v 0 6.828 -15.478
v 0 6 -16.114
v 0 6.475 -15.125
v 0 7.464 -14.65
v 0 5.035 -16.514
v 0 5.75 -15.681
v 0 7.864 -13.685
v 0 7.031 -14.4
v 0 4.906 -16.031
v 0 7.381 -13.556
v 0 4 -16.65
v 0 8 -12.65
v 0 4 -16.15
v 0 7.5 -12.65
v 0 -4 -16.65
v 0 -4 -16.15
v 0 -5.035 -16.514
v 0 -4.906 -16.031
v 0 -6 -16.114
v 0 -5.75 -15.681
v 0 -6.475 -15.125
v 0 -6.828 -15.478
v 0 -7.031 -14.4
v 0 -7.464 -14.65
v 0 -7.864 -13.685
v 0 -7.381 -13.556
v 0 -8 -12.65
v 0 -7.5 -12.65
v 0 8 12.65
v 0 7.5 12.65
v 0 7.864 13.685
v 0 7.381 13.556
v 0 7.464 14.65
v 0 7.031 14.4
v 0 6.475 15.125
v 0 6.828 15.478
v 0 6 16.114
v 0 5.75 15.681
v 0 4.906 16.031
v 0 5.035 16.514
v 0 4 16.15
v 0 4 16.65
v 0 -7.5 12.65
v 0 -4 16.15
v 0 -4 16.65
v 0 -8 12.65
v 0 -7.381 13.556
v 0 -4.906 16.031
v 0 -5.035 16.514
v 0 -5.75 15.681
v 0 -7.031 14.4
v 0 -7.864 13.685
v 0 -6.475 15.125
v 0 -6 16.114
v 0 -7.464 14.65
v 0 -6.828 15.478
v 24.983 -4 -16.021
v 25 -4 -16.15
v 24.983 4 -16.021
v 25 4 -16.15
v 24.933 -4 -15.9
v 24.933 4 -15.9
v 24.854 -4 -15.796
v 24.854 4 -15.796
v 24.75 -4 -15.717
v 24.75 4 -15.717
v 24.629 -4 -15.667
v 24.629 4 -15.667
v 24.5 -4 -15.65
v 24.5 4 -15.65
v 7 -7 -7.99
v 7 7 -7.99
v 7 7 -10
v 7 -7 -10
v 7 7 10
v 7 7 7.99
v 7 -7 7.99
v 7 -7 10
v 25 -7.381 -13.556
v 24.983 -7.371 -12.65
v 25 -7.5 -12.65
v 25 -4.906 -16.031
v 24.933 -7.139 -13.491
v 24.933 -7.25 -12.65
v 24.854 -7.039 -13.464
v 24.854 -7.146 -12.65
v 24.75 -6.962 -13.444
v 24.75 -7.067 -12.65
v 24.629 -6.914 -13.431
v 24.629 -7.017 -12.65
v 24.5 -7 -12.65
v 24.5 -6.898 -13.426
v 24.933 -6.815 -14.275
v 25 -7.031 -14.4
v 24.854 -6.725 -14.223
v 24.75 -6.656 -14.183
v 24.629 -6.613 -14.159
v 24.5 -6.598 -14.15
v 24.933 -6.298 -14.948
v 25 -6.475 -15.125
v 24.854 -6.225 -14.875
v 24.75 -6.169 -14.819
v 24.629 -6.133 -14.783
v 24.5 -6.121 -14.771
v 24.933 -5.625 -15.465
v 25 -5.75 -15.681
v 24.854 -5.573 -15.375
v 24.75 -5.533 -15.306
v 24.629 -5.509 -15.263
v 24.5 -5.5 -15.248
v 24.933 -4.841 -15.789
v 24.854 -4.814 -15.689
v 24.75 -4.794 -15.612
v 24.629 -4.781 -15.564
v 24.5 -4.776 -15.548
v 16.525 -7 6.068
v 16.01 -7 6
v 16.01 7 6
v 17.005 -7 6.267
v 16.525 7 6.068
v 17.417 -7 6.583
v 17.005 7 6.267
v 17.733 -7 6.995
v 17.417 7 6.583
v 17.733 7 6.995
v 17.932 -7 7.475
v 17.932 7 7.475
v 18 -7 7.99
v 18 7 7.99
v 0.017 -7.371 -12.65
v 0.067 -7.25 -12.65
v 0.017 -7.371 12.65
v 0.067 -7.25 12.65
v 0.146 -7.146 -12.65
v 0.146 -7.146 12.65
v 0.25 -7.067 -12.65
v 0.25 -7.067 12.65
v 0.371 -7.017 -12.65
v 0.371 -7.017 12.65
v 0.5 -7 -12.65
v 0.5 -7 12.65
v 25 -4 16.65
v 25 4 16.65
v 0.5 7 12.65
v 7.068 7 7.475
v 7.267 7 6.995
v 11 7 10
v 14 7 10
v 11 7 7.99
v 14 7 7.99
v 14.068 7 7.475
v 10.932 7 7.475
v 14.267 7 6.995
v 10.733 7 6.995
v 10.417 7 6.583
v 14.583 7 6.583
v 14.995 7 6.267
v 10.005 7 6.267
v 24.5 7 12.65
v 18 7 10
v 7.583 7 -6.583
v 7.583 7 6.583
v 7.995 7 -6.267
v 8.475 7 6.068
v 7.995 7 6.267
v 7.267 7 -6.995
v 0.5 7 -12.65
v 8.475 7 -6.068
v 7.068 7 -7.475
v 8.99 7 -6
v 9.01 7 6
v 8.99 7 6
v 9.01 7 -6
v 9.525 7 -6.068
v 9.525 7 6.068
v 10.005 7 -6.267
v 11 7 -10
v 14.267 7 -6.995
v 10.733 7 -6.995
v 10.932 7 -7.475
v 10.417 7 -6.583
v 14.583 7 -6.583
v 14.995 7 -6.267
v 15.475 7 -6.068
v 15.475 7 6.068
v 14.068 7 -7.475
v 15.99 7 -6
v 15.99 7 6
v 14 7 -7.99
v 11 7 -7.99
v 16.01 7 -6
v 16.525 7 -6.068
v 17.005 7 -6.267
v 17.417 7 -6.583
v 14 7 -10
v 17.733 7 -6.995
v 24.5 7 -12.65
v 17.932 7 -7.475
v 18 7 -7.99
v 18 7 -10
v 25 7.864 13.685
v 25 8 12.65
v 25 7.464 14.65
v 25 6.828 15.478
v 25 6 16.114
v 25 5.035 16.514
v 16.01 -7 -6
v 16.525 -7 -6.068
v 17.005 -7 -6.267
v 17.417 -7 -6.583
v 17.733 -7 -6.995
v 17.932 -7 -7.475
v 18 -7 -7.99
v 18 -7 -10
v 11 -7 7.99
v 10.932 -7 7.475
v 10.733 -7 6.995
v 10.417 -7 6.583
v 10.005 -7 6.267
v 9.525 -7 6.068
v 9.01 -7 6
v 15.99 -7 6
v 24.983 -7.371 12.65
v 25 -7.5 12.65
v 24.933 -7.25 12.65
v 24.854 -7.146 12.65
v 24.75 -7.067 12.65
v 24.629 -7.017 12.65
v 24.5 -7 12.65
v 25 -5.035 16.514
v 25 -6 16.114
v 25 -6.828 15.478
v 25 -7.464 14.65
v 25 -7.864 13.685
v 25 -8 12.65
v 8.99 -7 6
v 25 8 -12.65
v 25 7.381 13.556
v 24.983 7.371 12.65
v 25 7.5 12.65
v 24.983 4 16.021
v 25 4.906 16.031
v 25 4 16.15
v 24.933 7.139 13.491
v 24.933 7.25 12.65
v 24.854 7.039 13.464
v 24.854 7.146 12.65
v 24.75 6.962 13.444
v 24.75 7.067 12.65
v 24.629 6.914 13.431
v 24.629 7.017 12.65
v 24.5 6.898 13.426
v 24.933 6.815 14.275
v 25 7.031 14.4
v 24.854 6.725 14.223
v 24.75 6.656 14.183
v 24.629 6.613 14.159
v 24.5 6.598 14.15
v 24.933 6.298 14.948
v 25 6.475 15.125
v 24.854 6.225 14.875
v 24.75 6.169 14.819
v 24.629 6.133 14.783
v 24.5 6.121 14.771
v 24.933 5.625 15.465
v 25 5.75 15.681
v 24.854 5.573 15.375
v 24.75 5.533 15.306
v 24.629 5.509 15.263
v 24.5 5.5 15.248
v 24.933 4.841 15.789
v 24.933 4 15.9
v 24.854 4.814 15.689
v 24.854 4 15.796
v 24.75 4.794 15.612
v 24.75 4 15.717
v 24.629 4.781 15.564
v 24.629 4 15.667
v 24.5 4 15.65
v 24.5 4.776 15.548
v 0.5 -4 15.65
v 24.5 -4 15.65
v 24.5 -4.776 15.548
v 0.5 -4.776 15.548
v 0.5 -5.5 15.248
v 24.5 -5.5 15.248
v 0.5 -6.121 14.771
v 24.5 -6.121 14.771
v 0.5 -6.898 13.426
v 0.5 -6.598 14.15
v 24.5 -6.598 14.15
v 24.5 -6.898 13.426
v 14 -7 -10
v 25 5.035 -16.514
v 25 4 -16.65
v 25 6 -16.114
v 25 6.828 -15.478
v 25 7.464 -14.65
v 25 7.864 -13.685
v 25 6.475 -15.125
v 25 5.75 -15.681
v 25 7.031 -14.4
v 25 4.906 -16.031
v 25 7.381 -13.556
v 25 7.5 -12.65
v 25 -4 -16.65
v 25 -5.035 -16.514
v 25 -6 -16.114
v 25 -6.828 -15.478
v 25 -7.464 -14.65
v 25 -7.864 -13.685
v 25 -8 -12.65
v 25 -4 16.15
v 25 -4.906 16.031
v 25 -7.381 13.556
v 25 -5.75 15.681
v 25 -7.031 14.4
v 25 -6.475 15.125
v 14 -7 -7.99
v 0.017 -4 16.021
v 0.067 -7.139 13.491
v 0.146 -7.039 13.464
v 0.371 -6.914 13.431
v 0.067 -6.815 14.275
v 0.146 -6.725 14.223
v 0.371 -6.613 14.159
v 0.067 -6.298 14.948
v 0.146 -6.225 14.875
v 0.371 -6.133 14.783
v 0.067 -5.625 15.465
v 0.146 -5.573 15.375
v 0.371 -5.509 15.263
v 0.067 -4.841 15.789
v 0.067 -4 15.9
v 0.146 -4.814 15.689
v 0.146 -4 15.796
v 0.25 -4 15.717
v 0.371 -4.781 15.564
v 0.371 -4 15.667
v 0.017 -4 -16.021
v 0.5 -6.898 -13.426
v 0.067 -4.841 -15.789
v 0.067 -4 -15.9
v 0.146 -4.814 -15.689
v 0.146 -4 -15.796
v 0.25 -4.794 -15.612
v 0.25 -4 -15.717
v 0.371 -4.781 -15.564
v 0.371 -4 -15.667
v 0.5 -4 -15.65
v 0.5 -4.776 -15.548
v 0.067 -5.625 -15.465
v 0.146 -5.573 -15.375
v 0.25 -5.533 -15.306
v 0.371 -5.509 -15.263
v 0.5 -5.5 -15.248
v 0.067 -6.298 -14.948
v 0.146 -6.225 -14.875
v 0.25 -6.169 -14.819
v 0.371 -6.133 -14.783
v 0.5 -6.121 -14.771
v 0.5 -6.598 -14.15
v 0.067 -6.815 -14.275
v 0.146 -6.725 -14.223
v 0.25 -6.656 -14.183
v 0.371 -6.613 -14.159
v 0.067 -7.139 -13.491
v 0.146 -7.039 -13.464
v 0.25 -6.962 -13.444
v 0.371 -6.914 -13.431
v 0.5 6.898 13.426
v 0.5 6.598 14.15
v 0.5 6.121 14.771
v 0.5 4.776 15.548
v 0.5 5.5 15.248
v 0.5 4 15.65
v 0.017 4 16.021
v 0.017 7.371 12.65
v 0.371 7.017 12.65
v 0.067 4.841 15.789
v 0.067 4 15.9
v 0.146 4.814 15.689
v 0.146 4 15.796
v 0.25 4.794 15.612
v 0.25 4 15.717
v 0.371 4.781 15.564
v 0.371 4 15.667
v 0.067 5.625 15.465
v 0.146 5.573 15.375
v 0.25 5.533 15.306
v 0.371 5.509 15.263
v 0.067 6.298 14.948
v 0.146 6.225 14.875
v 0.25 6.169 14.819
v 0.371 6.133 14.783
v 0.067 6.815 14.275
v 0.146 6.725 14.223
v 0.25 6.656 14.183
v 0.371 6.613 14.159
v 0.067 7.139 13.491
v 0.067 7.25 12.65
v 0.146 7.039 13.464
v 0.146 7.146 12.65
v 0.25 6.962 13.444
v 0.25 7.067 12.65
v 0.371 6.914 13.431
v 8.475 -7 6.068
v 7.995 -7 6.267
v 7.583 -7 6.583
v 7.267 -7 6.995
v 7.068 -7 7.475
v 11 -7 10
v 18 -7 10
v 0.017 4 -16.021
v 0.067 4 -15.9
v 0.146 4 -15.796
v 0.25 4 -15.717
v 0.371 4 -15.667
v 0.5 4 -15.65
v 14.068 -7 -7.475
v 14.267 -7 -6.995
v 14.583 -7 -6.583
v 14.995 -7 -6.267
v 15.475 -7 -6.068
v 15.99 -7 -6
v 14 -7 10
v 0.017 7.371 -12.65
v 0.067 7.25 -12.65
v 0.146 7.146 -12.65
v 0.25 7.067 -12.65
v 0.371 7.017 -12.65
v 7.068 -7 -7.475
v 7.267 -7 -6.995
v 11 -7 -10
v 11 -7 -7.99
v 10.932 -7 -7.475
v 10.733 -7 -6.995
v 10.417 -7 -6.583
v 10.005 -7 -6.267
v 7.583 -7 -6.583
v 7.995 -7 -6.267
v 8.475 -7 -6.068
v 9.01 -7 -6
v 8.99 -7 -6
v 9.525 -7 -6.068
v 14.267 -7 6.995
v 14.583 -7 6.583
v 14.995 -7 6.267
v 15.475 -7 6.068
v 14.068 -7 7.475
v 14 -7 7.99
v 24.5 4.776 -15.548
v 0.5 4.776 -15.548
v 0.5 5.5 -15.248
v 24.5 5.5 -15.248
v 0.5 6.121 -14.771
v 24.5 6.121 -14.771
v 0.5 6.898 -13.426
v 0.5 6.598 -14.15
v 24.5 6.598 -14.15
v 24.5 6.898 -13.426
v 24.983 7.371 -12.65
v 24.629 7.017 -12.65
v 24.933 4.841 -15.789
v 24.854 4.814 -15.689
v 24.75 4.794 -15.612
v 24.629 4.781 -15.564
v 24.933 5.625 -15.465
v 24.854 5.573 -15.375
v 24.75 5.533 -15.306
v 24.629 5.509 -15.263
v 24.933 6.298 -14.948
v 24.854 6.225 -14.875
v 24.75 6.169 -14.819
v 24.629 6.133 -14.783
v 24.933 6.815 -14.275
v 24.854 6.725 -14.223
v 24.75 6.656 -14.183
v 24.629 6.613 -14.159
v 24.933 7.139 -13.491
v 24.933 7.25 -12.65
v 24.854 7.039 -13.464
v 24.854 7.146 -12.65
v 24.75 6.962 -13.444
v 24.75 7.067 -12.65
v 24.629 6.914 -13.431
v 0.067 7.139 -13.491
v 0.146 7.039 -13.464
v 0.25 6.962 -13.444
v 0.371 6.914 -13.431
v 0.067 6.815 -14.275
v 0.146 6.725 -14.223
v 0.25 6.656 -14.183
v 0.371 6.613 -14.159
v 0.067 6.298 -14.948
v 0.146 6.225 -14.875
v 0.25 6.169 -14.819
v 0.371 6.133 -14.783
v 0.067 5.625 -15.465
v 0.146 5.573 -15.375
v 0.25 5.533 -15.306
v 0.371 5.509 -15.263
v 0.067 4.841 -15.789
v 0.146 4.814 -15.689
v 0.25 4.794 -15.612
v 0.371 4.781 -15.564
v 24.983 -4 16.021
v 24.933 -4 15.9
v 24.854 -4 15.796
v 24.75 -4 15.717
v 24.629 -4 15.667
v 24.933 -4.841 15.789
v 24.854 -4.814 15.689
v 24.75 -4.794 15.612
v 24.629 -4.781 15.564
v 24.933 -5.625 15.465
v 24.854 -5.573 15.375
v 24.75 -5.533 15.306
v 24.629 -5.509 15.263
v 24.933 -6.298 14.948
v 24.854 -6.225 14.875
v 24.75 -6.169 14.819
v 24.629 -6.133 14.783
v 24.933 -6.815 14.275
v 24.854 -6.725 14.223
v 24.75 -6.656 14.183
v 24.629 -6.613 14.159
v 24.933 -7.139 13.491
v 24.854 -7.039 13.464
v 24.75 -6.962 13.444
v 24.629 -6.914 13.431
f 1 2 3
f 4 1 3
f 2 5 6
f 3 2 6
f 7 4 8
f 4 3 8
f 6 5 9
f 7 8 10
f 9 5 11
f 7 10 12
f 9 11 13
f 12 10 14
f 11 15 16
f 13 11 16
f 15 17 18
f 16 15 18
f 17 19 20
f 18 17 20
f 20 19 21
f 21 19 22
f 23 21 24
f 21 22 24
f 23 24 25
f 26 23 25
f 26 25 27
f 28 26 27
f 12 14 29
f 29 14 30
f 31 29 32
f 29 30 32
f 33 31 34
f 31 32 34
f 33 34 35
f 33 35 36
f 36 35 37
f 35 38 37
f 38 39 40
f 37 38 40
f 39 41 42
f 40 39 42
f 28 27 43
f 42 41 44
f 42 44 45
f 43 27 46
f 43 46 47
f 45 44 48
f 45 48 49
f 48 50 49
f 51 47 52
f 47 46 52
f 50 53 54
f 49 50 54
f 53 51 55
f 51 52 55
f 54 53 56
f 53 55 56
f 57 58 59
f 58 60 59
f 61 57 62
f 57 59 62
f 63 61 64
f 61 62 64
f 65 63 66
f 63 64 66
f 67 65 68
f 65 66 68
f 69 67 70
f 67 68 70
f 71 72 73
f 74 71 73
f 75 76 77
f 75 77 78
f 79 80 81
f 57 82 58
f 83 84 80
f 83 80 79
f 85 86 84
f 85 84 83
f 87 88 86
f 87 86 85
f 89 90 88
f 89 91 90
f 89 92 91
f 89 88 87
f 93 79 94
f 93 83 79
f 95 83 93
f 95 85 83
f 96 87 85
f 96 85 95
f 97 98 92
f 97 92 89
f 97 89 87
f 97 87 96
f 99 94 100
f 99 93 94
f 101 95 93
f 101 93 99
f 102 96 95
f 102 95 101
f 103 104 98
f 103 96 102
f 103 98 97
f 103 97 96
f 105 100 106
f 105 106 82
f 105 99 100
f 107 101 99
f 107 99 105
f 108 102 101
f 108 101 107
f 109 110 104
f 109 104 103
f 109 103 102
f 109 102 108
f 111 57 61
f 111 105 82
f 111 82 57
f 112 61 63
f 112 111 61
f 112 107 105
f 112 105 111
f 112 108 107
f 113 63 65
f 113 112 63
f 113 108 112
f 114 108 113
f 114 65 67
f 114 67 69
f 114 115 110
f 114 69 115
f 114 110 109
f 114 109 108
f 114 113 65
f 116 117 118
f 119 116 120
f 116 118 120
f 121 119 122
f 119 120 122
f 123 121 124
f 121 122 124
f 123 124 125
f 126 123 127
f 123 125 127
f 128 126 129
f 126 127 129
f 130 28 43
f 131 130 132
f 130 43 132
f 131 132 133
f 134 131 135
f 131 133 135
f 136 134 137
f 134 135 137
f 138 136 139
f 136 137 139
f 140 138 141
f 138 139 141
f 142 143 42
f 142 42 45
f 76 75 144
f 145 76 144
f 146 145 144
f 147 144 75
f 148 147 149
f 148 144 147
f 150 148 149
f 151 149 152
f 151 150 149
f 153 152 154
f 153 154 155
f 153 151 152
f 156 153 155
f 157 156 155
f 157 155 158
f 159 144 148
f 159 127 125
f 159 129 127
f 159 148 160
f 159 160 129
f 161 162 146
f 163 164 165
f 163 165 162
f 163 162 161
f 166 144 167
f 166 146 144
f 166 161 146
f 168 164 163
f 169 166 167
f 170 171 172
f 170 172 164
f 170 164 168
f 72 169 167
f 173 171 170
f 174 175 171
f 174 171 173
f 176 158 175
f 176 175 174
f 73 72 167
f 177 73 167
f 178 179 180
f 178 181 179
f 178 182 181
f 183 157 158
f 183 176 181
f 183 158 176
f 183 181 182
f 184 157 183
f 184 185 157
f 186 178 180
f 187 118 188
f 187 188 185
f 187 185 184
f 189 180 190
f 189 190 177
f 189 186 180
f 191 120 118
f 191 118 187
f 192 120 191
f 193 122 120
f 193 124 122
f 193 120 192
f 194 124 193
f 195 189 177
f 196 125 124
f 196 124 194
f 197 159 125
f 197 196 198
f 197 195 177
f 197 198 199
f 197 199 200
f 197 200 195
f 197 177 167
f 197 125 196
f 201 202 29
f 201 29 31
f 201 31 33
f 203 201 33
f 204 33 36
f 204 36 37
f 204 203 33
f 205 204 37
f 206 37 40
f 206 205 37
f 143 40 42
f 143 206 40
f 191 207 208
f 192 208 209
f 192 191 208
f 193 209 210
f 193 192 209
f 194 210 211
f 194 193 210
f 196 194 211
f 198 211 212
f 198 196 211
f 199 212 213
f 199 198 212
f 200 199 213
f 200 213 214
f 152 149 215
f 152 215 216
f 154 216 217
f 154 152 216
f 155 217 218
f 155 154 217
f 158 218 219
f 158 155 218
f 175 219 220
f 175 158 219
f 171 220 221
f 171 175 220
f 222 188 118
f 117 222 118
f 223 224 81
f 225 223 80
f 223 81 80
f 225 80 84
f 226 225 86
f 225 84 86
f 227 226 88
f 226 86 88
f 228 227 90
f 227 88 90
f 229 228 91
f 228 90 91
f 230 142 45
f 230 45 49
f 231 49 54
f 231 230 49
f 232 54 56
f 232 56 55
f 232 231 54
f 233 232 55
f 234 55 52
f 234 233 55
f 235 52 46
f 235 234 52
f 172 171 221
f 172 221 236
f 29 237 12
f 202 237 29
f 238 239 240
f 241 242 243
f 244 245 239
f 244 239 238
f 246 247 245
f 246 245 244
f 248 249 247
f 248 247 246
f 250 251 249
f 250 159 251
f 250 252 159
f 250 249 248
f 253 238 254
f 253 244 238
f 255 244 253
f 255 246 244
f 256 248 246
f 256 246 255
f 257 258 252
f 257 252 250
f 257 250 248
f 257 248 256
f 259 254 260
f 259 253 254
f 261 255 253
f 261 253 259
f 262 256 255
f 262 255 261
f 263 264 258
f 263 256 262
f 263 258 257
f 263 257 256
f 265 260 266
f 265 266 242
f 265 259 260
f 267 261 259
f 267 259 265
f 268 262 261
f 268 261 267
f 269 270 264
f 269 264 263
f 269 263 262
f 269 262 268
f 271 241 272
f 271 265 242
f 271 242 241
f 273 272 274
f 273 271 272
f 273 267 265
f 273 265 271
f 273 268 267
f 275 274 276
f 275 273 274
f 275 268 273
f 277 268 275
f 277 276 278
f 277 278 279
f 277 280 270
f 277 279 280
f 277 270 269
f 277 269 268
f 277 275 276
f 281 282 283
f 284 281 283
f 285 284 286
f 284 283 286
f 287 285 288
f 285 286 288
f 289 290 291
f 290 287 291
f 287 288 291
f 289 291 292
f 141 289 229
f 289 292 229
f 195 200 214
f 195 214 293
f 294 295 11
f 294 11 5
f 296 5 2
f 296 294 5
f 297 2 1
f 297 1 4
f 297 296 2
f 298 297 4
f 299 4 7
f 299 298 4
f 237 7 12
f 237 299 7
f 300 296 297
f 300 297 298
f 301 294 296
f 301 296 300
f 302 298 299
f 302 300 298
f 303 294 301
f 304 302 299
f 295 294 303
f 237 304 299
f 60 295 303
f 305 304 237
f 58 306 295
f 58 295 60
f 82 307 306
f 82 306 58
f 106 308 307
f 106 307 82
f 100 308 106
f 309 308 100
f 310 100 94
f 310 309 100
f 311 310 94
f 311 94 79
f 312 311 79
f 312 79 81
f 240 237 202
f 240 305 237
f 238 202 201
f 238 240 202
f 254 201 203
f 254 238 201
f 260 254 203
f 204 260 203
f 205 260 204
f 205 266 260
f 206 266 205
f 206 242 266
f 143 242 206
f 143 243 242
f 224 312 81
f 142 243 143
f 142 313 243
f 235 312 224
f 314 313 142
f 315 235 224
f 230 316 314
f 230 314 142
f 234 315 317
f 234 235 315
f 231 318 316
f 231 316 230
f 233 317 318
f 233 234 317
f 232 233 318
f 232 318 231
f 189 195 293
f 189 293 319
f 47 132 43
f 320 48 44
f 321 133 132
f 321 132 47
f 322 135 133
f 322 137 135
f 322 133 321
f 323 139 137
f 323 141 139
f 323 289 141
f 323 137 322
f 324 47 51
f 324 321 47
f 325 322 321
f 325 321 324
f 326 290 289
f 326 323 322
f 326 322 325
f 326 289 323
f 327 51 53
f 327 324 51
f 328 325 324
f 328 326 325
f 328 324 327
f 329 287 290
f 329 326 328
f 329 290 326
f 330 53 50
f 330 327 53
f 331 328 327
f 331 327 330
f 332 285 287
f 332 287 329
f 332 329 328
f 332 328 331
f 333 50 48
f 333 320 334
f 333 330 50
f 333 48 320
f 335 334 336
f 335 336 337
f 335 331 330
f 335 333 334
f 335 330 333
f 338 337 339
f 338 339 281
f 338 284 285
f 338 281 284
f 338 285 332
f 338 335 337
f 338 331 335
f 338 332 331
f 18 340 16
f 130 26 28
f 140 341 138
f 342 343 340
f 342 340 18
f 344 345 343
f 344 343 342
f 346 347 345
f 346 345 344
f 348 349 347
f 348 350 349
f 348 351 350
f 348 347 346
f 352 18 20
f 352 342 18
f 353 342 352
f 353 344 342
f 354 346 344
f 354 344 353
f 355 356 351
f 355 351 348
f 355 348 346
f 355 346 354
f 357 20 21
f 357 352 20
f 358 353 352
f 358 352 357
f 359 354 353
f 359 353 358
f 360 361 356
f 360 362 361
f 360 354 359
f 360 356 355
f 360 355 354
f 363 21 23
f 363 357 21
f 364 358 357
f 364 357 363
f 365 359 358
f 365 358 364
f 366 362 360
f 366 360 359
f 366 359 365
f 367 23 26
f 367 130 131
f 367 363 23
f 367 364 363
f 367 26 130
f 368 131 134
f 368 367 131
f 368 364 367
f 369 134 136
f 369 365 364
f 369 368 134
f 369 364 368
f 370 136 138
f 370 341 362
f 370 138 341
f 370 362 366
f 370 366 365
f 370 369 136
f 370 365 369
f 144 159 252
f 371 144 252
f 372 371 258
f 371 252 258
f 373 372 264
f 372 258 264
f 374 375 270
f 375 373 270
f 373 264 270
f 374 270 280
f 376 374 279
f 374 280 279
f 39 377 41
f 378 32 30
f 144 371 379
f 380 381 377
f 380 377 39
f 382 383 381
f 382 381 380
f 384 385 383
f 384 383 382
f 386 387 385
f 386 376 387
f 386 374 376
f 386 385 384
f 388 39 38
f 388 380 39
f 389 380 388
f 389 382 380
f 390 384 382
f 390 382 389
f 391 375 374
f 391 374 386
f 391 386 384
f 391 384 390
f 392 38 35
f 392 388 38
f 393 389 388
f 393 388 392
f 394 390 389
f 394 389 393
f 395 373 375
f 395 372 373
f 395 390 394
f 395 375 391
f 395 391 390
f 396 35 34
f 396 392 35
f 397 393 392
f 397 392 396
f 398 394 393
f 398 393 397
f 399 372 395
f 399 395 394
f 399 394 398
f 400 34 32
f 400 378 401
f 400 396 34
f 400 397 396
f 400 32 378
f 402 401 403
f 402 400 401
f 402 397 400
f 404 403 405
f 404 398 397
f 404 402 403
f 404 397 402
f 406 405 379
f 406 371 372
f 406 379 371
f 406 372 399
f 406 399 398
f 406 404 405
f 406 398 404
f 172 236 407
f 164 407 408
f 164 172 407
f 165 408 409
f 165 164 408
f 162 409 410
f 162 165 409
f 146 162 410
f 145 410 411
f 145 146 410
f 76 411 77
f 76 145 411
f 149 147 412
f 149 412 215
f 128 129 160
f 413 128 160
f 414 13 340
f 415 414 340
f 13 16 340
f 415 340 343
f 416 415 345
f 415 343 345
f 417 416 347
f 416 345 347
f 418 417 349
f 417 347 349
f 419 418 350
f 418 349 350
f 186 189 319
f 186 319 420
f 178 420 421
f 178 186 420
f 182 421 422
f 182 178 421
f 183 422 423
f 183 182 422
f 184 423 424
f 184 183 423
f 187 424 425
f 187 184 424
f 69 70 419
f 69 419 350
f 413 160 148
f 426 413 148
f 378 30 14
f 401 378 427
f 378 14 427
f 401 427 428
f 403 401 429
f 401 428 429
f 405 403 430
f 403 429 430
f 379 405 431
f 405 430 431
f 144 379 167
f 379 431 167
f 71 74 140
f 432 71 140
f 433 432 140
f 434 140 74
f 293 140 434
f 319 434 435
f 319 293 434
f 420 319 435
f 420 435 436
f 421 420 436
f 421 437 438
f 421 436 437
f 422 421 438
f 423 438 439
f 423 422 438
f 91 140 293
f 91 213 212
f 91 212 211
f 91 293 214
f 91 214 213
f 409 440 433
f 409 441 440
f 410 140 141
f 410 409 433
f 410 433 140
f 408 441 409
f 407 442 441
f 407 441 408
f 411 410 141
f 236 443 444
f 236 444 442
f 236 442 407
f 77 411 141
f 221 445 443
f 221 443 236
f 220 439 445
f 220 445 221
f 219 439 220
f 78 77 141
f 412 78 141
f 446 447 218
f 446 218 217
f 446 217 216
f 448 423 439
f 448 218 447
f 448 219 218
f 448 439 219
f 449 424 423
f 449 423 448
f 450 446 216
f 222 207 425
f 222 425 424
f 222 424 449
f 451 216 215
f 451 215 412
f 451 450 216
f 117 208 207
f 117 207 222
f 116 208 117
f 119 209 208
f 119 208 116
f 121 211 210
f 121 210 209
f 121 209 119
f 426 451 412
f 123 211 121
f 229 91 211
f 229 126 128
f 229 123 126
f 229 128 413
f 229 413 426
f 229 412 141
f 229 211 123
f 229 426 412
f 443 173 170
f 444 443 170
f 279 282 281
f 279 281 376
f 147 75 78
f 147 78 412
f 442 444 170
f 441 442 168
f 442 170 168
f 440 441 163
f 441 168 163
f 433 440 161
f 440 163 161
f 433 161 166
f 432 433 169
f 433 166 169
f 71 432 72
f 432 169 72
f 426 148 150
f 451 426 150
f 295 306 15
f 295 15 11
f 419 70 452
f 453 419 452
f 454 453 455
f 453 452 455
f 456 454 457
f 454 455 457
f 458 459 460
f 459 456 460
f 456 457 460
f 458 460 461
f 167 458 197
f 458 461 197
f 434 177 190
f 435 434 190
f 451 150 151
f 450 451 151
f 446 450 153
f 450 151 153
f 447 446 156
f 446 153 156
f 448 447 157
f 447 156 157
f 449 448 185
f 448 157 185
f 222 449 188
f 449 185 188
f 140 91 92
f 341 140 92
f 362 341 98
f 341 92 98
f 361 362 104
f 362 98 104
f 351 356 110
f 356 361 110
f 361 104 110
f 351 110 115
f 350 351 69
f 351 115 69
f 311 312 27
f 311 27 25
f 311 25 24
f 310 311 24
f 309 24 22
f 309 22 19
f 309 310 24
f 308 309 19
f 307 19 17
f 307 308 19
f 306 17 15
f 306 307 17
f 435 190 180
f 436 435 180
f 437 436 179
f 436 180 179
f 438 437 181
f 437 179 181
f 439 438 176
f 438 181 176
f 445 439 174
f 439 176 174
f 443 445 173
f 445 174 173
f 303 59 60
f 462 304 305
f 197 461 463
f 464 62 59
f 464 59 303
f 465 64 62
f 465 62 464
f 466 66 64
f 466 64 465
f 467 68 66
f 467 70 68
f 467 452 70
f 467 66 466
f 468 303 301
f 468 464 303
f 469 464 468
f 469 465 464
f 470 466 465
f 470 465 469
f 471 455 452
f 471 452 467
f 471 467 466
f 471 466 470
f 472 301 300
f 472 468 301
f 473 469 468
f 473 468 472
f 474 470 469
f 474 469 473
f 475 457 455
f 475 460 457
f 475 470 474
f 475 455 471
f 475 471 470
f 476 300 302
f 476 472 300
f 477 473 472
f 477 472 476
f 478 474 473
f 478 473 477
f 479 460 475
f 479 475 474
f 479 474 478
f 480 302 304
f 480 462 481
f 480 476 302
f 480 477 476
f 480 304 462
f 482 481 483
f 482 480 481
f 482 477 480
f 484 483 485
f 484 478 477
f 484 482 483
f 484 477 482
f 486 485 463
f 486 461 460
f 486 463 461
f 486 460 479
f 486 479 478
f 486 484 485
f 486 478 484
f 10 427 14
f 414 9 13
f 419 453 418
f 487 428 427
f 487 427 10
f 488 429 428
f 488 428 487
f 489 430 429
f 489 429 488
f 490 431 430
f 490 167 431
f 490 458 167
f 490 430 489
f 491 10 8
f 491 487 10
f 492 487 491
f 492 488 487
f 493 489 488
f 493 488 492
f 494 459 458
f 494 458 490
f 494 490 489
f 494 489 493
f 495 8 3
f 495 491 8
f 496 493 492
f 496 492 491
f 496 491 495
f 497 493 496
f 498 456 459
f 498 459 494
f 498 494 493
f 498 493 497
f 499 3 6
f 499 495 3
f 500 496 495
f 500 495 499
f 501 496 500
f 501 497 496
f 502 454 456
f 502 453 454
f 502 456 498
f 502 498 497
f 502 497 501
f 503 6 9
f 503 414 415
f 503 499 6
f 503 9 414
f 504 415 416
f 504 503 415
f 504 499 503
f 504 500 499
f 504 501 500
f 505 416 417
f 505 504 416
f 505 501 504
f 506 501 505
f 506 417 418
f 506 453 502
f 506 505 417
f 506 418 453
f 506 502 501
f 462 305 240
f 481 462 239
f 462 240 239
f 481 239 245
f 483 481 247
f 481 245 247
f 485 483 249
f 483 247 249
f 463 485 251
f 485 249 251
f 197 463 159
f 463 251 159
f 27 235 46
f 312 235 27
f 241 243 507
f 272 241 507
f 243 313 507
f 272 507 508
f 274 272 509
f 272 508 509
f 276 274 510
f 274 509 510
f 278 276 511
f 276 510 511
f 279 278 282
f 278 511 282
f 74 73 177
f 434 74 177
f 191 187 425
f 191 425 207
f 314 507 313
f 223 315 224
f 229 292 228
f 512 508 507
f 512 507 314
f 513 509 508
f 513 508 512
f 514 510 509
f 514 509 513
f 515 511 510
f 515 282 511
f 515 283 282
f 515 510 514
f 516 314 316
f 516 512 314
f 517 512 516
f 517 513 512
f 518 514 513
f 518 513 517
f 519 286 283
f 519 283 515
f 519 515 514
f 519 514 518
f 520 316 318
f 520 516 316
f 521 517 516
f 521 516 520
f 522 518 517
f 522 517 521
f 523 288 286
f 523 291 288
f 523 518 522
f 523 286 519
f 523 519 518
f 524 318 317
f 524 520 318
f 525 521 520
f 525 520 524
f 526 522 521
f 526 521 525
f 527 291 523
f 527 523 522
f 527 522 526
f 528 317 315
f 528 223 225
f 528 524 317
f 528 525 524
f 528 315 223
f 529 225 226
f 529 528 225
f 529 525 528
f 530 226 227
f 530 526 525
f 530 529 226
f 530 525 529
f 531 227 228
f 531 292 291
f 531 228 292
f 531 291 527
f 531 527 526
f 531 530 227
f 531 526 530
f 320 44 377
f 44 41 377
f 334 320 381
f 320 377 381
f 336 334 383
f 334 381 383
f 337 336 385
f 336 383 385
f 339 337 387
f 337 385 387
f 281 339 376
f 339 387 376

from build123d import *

# Parameters (mm, degrees)
FILLET1_R                       = 0.5
BOSS_EXTRUDE6_REACH             = 33.084
BOSS_EXTRUDE6_DIRECTION_2_REACH = 33.084
MIRROR2_COPY_1_REACH            = 33.084
MIRROR2_COPY_2_REACH            = 33.084
MIRROR2_COPY_3_REACH            = 33.084
MIRROR2_COPY_4_REACH            = 33.084


with BuildPart() as part:
    # Sweep1: sweep along a path in Sketch2path
    with BuildLine(Plane.XY) as sweep1_path:
        Line((0, 0), (25, 0))
    # Sketch3 → Sweep1 (sweep)
    with BuildSketch(Plane(origin=(0, 0, 0), x_dir=(0, 0, -1), z_dir=(1, 0, 0))):
        with BuildLine():
            Line((12.65, 8), (-12.65, 8))
            ThreePointArc((-12.65, 8), (-15.478427125, 6.828427125), (-16.65, 4))
            Line((-16.65, 4), (-16.65, -4))
            ThreePointArc((-16.65, -4), (-15.478427125, -6.828427125), (-12.65, -8))
            Line((-12.65, -8), (12.65, -8))
            ThreePointArc((12.65, -8), (15.478427125, -6.828427125), (16.65, -4))
            Line((16.65, -4), (16.65, 4))
            ThreePointArc((16.65, 4), (15.478427125, 6.828427125), (12.65, 8))
        make_face()
        with BuildLine():
            Line((-15.65, 4), (-15.65, -4))
            ThreePointArc((-15.65, -4), (-14.771320344, -6.121320344), (-12.65, -7))
            Line((-12.65, -7), (12.65, -7))
            ThreePointArc((12.65, -7), (14.771320344, -6.121320344), (15.65, -4))
            Line((15.65, -4), (15.65, 4))
            ThreePointArc((15.65, 4), (14.771320344, 6.121320344), (12.65, 7))
            Line((12.65, 7), (-12.65, 7))
            ThreePointArc((-12.65, 7), (-14.771320344, 6.121320344), (-15.65, 4))
        make_face(mode=Mode.SUBTRACT)
    sweep(path=sweep1_path.line)

    # Fillet1
    fillet1_edges = [part.edges().sort_by_distance(p)[0] for p in [
        (25, -6.121320344, 14.771320344),
        (25, 0, 15.65),
        (25, 6.121320344, 14.771320344),
        (25, 7, 0),
        (25, 6.121320344, -14.771320344),
        (25, 0, -15.65),
        (25, -6.121320344, -14.771320344),
        (0, -6.121320344, 14.771320344),
        (0, 0, 15.65),
        (0, 6.121320344, 14.771320344),
        (0, 7, 0),
        (0, 6.121320344, -14.771320344),
        (0, 0, -15.65),
        (0, -6.121320344, -14.771320344),
        (25, -7, 0),
        (0, -7, 0),
    ]]
    fillet(fillet1_edges, radius=FILLET1_R)

    # Sketch13 → Boss-Extrude6 (add, up to next)
    with BuildSketch(Plane(origin=(0, 0, 0), x_dir=(1, 0, 0), z_dir=(0, 1, 0)), mode=Mode.PRIVATE) as boss_extrude6_sk1:
        with BuildLine():
            Line((15.99, -6), (16.01, -6))
            ThreePointArc((16.01, -6), (17.417142495, -6.582857505), (18, -7.99))
            Line((18, -7.99), (18, -10))
            Line((18, -10), (14, -10))
            Line((14, -10), (14, -7.99))
            ThreePointArc((14, -7.99), (14.582857505, -6.582857505), (15.99, -6))
        make_face()
    boss_extrude6_tool1 = extrude(boss_extrude6_sk1.sketch, amount=BOSS_EXTRUDE6_REACH, mode=Mode.PRIVATE) - part.part
    boss_extrude6 = boss_extrude6_tool1.solids().sort_by_distance((16, 0, 8.184882))[0]
    add(boss_extrude6)

    # Sketch13 → Boss-Extrude6 direction 2 (add, up to next)
    with BuildSketch(Plane(origin=(0, 0, 0), x_dir=(1, 0, 0), z_dir=(0, 1, 0)), mode=Mode.PRIVATE) as boss_extrude6_direction_2_sk1:
        with BuildLine():
            Line((15.99, -6), (16.01, -6))
            ThreePointArc((16.01, -6), (17.417142495, -6.582857505), (18, -7.99))
            Line((18, -7.99), (18, -10))
            Line((18, -10), (14, -10))
            Line((14, -10), (14, -7.99))
            ThreePointArc((14, -7.99), (14.582857505, -6.582857505), (15.99, -6))
        make_face()
    boss_extrude6_direction_2_tool1 = extrude(boss_extrude6_direction_2_sk1.sketch, amount=-BOSS_EXTRUDE6_DIRECTION_2_REACH, mode=Mode.PRIVATE) - part.part
    boss_extrude6_direction_2 = boss_extrude6_direction_2_tool1.solids().sort_by_distance((16, 0, 8.184882))[0]
    add(boss_extrude6_direction_2)

    # Mirror1: Boss-Extrude6, Boss-Extrude6 direction 2 across plane
    add(boss_extrude6.mirror(Plane(origin=(12.5, 0, 0), x_dir=(0, 0, 1), z_dir=(1, 0, 0))))
    add(boss_extrude6_direction_2.mirror(Plane(origin=(12.5, 0, 0), x_dir=(0, 0, 1), z_dir=(1, 0, 0))))

    # Mirror2 copy 1 sketch → Mirror2 copy 1 (add, up to next)
    with BuildSketch(Plane(origin=(25, 0, 0), x_dir=(-1, 0, 0), z_dir=(0, 1, 0)), mode=Mode.PRIVATE) as mirror2_copy_1_sk1:
        with BuildLine():
            Line((15.99, -6), (16.01, -6))
            ThreePointArc((16.01, -6), (17.417142495, -6.582857505), (18, -7.99))
            Line((18, -7.99), (18, -10))
            Line((18, -10), (14, -10))
            Line((14, -10), (14, -7.99))
            ThreePointArc((14, -7.99), (14.582857505, -6.582857505), (15.99, -6))
        make_face()
    mirror2_copy_1_tool1 = extrude(mirror2_copy_1_sk1.sketch, amount=MIRROR2_COPY_1_REACH, mode=Mode.PRIVATE) - part.part
    add(mirror2_copy_1_tool1.solids().sort_by_distance((9, 0, -8.184882))[0])

    # Mirror2 copy 2 sketch → Mirror2 copy 2 (add, up to next)
    with BuildSketch(Plane(origin=(25, 0, 0), x_dir=(-1, 0, 0), z_dir=(0, 1, 0)), mode=Mode.PRIVATE) as mirror2_copy_2_sk1:
        with BuildLine():
            Line((15.99, -6), (16.01, -6))
            ThreePointArc((16.01, -6), (17.417142495, -6.582857505), (18, -7.99))
            Line((18, -7.99), (18, -10))
            Line((18, -10), (14, -10))
            Line((14, -10), (14, -7.99))
            ThreePointArc((14, -7.99), (14.582857505, -6.582857505), (15.99, -6))
        make_face()
    mirror2_copy_2_tool1 = extrude(mirror2_copy_2_sk1.sketch, amount=-MIRROR2_COPY_2_REACH, mode=Mode.PRIVATE) - part.part
    add(mirror2_copy_2_tool1.solids().sort_by_distance((9, 0, -8.184882))[0])

    # Mirror2 copy 3 sketch → Mirror2 copy 3 (add, up to next)
    with BuildSketch(Plane(origin=(0, 0, 0), x_dir=(1, 0, 0), z_dir=(0, 1, 0)), mode=Mode.PRIVATE) as mirror2_copy_3_sk1:
        with BuildLine():
            Line((15.99, 6), (16.01, 6))
            ThreePointArc((16.01, 6), (17.417142495, 6.582857505), (18, 7.99))
            Line((18, 7.99), (18, 10))
            Line((18, 10), (14, 10))
            Line((14, 10), (14, 7.99))
            ThreePointArc((14, 7.99), (14.582857505, 6.582857505), (15.99, 6))
        make_face()
    mirror2_copy_3_tool1 = extrude(mirror2_copy_3_sk1.sketch, amount=MIRROR2_COPY_3_REACH, mode=Mode.PRIVATE) - part.part
    add(mirror2_copy_3_tool1.solids().sort_by_distance((16, 0, -8.184882))[0])

    # Mirror2 copy 4 sketch → Mirror2 copy 4 (add, up to next)
    with BuildSketch(Plane(origin=(0, 0, 0), x_dir=(1, 0, 0), z_dir=(0, 1, 0)), mode=Mode.PRIVATE) as mirror2_copy_4_sk1:
        with BuildLine():
            Line((15.99, 6), (16.01, 6))
            ThreePointArc((16.01, 6), (17.417142495, 6.582857505), (18, 7.99))
            Line((18, 7.99), (18, 10))
            Line((18, 10), (14, 10))
            Line((14, 10), (14, 7.99))
            ThreePointArc((14, 7.99), (14.582857505, 6.582857505), (15.99, 6))
        make_face()
    mirror2_copy_4_tool1 = extrude(mirror2_copy_4_sk1.sketch, amount=-MIRROR2_COPY_4_REACH, mode=Mode.PRIVATE) - part.part
    add(mirror2_copy_4_tool1.solids().sort_by_distance((16, 0, -8.184882))[0])


solid = part.part
